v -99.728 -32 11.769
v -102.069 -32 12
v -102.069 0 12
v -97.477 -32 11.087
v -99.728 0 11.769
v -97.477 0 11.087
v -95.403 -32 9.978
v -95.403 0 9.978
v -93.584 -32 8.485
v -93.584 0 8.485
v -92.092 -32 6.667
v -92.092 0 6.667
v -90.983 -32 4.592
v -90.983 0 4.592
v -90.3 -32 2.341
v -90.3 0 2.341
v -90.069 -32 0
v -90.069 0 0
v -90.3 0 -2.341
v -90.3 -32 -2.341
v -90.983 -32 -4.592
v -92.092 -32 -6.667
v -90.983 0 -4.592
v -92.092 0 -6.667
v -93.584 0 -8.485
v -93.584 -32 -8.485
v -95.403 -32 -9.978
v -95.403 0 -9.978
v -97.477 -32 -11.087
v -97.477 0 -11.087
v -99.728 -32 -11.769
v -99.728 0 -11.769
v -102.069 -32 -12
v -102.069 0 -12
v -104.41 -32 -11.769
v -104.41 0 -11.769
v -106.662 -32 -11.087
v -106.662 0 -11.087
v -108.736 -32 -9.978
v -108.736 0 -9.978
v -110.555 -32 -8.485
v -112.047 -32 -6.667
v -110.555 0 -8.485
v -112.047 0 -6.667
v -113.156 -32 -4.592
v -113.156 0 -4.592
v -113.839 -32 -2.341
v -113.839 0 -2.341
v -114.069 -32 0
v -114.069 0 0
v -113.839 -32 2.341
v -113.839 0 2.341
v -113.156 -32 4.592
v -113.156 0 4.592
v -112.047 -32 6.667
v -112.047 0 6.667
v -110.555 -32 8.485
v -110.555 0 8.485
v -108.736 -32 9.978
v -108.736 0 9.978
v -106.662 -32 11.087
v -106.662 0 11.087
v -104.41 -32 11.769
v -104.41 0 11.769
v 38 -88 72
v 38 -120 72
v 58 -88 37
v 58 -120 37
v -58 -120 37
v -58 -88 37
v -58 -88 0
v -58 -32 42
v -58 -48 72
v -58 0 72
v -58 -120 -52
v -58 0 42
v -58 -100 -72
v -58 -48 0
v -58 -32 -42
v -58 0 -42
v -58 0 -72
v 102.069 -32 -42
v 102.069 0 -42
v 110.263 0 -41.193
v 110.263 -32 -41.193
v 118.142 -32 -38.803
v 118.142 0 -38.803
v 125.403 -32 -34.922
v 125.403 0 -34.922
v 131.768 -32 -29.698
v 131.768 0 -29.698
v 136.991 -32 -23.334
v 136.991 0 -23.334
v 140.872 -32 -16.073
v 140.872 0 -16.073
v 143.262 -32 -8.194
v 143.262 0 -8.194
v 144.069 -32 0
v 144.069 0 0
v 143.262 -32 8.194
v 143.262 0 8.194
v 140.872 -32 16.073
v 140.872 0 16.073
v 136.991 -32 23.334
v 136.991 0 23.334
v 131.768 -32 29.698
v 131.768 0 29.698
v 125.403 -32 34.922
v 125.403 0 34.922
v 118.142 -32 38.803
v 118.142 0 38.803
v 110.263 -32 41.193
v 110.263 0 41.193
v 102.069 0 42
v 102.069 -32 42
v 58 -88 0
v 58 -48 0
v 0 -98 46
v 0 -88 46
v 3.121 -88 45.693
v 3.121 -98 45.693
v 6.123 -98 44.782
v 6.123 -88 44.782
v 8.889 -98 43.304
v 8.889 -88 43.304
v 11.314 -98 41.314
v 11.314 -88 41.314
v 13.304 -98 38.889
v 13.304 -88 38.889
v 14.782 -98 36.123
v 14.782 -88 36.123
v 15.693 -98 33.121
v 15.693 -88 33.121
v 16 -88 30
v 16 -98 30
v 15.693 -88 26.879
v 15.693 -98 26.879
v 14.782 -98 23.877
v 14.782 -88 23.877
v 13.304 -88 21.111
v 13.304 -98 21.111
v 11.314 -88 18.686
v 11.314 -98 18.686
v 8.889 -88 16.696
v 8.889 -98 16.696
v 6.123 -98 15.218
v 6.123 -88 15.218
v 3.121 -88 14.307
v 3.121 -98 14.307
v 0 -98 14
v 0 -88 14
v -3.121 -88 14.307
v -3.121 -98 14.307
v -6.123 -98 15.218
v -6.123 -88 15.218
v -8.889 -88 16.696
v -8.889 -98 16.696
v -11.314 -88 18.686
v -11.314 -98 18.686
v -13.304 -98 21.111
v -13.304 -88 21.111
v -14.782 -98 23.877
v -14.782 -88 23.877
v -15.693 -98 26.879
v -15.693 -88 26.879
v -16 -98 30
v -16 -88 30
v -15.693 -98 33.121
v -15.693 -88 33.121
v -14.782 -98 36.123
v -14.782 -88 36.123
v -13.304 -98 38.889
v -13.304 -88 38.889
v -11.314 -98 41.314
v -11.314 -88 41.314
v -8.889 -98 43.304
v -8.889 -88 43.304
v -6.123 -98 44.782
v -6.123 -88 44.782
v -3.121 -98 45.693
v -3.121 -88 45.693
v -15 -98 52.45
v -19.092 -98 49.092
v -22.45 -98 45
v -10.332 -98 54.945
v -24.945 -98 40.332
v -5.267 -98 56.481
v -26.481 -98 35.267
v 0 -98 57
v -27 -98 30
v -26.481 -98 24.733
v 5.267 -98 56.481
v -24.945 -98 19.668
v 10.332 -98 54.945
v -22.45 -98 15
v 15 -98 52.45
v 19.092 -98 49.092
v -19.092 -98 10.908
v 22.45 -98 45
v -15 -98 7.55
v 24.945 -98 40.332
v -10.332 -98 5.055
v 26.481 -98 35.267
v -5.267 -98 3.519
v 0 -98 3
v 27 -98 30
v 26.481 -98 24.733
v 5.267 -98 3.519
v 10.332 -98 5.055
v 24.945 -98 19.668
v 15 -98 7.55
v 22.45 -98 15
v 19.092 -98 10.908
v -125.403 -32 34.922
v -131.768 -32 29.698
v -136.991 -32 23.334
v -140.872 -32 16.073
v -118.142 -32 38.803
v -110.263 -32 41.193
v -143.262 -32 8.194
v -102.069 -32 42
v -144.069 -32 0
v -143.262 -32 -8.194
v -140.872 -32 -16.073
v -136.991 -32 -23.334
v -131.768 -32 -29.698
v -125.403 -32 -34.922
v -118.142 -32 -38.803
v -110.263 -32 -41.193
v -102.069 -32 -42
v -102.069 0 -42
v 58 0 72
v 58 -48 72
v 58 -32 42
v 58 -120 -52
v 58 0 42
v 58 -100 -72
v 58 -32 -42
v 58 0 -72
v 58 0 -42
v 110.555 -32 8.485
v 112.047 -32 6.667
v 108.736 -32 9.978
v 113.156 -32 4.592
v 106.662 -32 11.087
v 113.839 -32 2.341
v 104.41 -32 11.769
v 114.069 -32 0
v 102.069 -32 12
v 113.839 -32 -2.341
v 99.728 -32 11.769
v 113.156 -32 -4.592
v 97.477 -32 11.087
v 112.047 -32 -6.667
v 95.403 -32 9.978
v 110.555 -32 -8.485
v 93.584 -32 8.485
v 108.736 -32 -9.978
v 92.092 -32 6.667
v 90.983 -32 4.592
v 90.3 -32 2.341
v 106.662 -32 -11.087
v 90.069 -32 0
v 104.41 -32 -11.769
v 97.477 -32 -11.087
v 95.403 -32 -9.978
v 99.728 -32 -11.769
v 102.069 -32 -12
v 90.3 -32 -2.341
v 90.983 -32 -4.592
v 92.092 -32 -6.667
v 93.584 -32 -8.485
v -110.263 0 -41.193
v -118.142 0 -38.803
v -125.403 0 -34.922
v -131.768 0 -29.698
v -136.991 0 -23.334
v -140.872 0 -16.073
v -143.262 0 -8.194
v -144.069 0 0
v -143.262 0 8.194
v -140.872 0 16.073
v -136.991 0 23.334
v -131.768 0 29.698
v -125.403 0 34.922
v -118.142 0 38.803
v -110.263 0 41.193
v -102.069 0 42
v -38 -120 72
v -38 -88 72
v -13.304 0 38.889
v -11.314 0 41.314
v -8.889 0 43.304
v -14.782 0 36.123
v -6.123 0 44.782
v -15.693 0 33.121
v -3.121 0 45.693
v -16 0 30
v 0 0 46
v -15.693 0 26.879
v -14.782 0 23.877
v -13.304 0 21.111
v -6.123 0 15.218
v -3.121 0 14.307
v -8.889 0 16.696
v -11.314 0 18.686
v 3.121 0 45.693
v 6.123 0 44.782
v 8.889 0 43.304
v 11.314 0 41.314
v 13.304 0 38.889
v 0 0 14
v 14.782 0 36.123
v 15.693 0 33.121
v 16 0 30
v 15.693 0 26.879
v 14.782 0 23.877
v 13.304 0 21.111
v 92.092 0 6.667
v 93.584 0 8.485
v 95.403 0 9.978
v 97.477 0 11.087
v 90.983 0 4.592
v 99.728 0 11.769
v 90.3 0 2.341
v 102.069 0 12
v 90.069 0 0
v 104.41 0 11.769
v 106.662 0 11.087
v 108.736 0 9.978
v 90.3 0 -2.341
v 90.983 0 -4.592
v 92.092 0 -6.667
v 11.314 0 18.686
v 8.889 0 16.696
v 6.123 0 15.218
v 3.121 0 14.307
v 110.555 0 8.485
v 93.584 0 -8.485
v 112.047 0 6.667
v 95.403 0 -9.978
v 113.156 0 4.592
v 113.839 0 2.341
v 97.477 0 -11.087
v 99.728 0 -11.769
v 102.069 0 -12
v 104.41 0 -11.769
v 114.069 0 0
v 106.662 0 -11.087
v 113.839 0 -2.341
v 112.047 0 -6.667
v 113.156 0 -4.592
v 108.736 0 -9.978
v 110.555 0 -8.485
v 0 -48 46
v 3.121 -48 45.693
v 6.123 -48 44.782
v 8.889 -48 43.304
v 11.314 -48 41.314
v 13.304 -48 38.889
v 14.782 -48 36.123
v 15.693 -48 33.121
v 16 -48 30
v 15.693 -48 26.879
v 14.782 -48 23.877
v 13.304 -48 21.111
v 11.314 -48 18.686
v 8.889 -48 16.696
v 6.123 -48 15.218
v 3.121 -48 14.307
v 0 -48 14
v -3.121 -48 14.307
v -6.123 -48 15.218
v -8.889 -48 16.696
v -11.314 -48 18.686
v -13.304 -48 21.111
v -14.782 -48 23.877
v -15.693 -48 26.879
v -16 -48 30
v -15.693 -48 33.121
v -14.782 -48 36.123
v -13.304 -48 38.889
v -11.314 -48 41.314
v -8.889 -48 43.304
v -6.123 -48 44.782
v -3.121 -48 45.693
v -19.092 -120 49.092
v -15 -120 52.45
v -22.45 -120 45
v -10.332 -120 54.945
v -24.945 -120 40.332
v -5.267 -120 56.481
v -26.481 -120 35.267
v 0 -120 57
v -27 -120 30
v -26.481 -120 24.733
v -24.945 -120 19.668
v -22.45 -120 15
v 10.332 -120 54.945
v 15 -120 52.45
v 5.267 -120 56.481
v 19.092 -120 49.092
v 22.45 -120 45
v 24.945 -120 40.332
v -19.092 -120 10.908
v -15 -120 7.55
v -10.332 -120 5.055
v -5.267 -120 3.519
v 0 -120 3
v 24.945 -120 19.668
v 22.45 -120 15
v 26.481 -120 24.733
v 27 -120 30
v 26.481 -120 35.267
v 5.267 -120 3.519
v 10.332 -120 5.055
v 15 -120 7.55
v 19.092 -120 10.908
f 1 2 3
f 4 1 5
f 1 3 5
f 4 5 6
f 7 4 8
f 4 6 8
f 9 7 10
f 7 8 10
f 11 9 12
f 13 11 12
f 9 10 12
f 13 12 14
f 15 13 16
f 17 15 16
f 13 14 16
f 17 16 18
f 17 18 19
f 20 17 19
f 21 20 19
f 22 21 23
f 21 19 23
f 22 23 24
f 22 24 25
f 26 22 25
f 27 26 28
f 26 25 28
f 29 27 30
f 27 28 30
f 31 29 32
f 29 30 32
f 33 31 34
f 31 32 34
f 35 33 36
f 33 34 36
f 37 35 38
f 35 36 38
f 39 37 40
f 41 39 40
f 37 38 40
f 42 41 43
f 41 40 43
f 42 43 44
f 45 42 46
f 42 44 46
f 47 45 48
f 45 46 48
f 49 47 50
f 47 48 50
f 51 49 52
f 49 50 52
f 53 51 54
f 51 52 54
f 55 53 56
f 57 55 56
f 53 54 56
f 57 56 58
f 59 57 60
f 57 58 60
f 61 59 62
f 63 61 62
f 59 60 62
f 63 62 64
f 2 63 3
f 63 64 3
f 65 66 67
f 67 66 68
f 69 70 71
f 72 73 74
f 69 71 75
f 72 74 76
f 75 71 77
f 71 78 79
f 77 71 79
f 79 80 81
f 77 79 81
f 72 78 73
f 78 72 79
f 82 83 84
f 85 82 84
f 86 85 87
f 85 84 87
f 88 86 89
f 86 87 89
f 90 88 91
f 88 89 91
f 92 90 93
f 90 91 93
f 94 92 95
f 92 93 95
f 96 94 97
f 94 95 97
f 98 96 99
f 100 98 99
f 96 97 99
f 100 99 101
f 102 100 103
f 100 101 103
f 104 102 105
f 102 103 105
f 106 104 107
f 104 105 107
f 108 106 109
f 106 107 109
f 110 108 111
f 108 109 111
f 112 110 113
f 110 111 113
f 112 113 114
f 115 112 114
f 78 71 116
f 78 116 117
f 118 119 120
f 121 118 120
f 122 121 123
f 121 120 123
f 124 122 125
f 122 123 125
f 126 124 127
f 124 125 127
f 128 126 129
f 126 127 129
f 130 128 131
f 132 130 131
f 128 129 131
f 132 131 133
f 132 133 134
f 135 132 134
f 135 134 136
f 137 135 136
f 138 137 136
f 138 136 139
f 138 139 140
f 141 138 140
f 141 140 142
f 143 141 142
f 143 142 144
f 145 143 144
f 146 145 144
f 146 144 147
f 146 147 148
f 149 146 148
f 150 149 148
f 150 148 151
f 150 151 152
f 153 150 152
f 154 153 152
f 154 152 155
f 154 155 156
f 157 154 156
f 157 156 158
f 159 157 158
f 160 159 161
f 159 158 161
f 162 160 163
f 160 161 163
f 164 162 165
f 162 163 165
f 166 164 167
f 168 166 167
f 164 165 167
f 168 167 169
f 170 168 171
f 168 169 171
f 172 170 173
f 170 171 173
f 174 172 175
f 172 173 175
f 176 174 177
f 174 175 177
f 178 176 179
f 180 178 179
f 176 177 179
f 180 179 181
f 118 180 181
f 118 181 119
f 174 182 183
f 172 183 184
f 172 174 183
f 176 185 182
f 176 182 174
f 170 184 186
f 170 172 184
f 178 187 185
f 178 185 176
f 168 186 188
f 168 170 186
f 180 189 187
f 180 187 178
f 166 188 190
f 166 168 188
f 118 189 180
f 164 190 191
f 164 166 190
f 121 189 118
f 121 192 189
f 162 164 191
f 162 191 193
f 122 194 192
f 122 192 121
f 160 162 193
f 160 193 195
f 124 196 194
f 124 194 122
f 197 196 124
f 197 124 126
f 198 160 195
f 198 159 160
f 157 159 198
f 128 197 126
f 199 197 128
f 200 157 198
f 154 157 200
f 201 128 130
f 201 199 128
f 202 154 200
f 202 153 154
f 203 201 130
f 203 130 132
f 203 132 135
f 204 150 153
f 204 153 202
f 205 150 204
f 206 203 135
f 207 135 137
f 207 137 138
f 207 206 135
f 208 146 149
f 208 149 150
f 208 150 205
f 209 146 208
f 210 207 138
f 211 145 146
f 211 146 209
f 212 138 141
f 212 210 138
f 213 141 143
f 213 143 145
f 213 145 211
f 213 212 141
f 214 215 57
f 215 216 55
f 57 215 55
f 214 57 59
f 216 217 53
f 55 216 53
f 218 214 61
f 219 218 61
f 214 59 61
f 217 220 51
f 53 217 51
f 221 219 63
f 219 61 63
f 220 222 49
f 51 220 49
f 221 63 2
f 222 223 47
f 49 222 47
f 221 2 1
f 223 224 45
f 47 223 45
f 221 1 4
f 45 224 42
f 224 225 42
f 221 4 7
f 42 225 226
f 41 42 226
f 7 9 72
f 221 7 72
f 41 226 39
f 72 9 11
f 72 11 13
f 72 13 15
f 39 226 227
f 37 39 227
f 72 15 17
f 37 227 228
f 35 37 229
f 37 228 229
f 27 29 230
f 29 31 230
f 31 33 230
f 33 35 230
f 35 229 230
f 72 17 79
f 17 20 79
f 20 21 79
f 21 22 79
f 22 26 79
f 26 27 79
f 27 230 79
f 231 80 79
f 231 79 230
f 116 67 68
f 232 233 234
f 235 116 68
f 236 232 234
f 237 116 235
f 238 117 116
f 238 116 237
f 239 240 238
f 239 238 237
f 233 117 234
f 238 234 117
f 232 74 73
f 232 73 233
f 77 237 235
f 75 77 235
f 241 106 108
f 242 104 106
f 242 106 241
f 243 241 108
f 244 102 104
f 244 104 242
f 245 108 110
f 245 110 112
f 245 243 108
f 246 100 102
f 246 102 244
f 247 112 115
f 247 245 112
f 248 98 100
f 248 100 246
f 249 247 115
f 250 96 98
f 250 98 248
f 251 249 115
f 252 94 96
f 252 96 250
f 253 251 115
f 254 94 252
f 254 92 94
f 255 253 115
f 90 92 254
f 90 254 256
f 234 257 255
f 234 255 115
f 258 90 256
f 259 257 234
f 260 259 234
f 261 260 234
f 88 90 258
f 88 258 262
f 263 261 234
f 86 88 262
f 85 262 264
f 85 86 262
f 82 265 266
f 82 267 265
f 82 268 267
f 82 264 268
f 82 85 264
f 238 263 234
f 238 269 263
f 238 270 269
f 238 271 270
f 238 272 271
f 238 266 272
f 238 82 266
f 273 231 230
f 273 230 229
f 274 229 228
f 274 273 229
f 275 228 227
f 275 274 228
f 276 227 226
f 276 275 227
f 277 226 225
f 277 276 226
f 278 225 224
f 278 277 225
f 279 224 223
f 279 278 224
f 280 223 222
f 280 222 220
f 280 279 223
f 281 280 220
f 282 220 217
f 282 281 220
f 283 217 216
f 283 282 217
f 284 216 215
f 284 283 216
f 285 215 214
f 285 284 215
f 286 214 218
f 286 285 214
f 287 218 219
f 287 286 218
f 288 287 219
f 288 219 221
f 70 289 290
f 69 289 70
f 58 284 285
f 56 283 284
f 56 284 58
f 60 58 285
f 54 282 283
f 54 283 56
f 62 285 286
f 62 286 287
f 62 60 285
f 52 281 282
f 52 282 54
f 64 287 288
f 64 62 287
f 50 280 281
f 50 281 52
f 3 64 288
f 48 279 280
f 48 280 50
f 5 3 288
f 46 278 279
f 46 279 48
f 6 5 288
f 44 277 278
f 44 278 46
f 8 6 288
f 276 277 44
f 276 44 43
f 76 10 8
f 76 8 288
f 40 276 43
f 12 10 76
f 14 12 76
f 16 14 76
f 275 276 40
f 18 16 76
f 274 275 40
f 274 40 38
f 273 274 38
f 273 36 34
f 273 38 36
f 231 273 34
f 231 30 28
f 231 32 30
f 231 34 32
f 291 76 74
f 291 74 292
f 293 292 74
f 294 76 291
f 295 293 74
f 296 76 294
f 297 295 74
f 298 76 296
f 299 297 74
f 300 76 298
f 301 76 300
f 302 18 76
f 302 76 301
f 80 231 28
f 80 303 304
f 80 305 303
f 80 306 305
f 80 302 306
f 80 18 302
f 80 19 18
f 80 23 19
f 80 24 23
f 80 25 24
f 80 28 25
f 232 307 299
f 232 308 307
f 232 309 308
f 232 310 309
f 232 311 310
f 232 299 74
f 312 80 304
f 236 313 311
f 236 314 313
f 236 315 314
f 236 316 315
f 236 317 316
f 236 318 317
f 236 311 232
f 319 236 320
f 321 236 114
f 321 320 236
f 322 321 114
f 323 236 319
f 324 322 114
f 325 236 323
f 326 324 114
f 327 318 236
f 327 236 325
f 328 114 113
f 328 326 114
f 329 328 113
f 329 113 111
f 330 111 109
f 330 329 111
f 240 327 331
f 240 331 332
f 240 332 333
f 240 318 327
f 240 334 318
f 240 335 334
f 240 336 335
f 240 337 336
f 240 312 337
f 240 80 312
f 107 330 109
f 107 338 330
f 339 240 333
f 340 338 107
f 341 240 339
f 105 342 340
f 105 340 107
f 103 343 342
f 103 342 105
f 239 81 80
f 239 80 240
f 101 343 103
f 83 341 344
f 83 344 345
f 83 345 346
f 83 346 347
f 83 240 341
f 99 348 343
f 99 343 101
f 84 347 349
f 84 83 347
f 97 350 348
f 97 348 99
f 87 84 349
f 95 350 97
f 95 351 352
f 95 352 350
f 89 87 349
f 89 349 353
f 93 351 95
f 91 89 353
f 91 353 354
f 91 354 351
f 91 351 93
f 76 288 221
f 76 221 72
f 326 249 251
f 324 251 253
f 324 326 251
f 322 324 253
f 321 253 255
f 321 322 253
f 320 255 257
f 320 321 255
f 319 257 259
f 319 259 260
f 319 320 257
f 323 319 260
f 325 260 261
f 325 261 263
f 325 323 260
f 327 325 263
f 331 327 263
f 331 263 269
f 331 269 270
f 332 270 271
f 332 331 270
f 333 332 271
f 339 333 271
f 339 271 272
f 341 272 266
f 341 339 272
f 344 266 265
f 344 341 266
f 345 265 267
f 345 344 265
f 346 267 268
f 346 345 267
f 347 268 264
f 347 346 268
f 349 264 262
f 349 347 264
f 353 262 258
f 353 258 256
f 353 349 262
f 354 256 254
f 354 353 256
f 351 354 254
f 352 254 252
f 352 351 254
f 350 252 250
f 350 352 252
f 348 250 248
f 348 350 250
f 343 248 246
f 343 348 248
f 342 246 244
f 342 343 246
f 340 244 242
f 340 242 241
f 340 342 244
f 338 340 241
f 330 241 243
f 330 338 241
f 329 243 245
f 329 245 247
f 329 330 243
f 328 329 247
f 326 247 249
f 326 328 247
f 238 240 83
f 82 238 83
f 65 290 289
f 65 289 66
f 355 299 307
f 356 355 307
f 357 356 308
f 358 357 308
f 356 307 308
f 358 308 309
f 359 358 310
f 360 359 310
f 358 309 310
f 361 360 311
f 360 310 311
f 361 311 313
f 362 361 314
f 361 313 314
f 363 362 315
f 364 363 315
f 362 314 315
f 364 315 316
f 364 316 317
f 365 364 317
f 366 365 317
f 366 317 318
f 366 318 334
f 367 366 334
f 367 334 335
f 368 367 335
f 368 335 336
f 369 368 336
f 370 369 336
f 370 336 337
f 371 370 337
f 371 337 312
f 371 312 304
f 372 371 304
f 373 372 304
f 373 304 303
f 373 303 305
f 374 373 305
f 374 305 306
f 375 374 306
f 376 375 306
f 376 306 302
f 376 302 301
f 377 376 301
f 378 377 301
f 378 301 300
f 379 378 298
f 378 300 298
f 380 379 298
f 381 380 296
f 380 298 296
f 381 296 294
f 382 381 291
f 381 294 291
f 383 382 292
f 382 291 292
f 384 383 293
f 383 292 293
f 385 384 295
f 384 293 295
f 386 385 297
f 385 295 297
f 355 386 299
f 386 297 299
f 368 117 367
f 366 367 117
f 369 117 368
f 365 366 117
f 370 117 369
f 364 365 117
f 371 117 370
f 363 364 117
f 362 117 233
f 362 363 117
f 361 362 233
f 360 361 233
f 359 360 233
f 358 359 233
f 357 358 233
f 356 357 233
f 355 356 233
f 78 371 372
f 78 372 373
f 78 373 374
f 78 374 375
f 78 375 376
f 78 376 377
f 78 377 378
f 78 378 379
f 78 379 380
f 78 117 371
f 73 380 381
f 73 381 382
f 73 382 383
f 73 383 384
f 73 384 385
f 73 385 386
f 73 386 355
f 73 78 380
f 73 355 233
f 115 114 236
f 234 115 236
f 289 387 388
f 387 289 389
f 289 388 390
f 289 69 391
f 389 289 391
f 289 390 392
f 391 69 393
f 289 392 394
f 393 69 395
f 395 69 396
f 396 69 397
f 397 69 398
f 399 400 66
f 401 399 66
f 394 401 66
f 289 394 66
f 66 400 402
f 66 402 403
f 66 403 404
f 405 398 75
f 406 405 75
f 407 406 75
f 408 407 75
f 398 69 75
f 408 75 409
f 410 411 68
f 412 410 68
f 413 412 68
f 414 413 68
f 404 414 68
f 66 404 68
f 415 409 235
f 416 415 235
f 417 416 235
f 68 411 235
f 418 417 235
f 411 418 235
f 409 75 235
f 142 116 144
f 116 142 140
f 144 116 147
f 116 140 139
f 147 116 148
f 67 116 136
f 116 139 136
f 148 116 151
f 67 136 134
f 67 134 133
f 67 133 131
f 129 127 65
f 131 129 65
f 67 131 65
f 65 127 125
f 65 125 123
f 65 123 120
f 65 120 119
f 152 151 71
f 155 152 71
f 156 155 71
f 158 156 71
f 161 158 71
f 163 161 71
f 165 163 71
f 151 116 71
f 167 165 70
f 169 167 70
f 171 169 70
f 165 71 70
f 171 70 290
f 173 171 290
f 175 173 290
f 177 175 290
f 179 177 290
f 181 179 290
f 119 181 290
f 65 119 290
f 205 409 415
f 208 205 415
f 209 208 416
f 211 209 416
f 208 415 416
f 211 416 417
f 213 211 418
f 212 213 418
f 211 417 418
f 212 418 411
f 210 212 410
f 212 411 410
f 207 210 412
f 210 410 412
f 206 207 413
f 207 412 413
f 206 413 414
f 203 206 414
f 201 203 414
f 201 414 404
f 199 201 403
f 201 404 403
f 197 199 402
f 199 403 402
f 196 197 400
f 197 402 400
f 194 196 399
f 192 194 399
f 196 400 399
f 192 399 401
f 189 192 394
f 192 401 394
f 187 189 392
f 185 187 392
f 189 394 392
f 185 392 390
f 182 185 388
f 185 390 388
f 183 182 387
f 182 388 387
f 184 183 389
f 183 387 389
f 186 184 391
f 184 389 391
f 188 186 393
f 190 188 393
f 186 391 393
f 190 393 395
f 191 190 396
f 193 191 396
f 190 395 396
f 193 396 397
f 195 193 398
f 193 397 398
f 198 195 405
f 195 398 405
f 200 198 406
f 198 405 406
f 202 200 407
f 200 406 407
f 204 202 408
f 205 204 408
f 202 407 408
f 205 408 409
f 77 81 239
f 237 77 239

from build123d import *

# Parameters (mm, degrees)
SKETCH_1_W          = 116
SKETCH_1_H          = 144
EXTRUDE_1_DEPTH     = 120
SKETCH_2_R          = 12
EXTRUDE_3_DEPTH     = 32
SKETCH_6_W          = 72
SKETCH_6_H          = 40
CUT_EXTRUDE_1_DEPTH = 182.76908428
CUT_EXTRUDE_3_REACH = 202.848
CUT_EXTRUDE_4_REACH = 247.797
SKETCH_10_R         = 16
CUT_EXTRUDE_5_DEPTH = 201.848142751
SKETCH_11_R         = 27
CUT_EXTRUDE_6_DEPTH = 22


with BuildPart() as part:
    # 草图1 → 凸台-拉伸1 (new body)
    with BuildSketch(Plane(origin=(0, 0, 0), x_dir=(1, 0, 0), z_dir=(0, 1, 0))):
        Rectangle(SKETCH_1_W, SKETCH_1_H)
    extrude(amount=-EXTRUDE_1_DEPTH)

    # 草图2 → 凸台-拉伸3 (add)
    with BuildSketch(Plane(origin=(0, 0, 0), x_dir=(1, 0, 0), z_dir=(0, 1, 0))):
        with BuildLine():
            Line((-58, 42), (-102.069345964, 42))
            ThreePointArc((-102.069345964, 42), (-144.069345964, 0), (-102.069345964, -42))
            Line((-102.069345964, -42), (-58, -42))
            Line((-58, -42), (-58, 42))
        make_face()
        with Locations(Location((-102.069345964, 0, 0), (0, 0, 270))):
            Circle(SKETCH_2_R, mode=Mode.SUBTRACT)
    extrude_3 = extrude(amount=-EXTRUDE_3_DEPTH)

    # 草图6 → 切除-拉伸1 (cut, through all)
    with BuildSketch(Plane.ZY.offset(58)):
        with Locations((36, -68)):
            Rectangle(SKETCH_6_W, SKETCH_6_H)
    extrude(amount=-CUT_EXTRUDE_1_DEPTH, mode=Mode.SUBTRACT)

    # 草图8 → 切除-拉伸3 (cut, up to next)
    with BuildSketch(Plane.XZ.offset(120), mode=Mode.PRIVATE) as cut_extrude_3_sk1:
        Polygon((-38, 72), (-58, 37), (-58, 72), align=None)
    cut_extrude_3_tool1 = extrude(cut_extrude_3_sk1.sketch, amount=-CUT_EXTRUDE_3_REACH, mode=Mode.PRIVATE) & part.part
    cut_extrude_3 = cut_extrude_3_tool1.solids().sort_by_distance((-51.333333, -120, 60.333333))[0]
    add(cut_extrude_3, mode=Mode.SUBTRACT)

    # 镜向1: 凸台-拉伸3, 切除-拉伸3 across plane
    add(extrude_3.mirror(Plane(origin=(0, 0, 0), x_dir=(0, 0, 1), z_dir=(1, 0, 0))))
    add(cut_extrude_3.mirror(Plane(origin=(0, 0, 0), x_dir=(0, 0, 1), z_dir=(1, 0, 0))), mode=Mode.SUBTRACT)

    # 草图9 → 切除-拉伸4 (cut, up to next)
    with BuildSketch(Plane.ZY.offset(58), mode=Mode.PRIVATE) as cut_extrude_4_sk1:
        Polygon((-72, -100), (-52, -120), (-72, -120), align=None)
    cut_extrude_4_tool1 = extrude(cut_extrude_4_sk1.sketch, amount=-CUT_EXTRUDE_4_REACH, mode=Mode.PRIVATE) & part.part
    add(cut_extrude_4_tool1.solids().sort_by_distance((-58, -113.333333, -65.333333))[0], mode=Mode.SUBTRACT)

    # 草图10 → 切除-拉伸5 (cut, through all)
    with BuildSketch(Plane(origin=(0, 0, 0), x_dir=(1, 0, 0), z_dir=(0, 1, 0))):
        with Locations(Location((0, -30, 0), (0, 0, 270))):
            Circle(SKETCH_10_R)
    extrude(amount=-CUT_EXTRUDE_5_DEPTH, mode=Mode.SUBTRACT)

    # 草图11 → 切除-拉伸6 (cut)
    with BuildSketch(Plane.XZ.offset(120)):
        with Locations(Location((0, 30, 0), (0, 0, 270))):
            Circle(SKETCH_11_R)
    extrude(amount=-CUT_EXTRUDE_6_DEPTH, mode=Mode.SUBTRACT)


solid = part.part
